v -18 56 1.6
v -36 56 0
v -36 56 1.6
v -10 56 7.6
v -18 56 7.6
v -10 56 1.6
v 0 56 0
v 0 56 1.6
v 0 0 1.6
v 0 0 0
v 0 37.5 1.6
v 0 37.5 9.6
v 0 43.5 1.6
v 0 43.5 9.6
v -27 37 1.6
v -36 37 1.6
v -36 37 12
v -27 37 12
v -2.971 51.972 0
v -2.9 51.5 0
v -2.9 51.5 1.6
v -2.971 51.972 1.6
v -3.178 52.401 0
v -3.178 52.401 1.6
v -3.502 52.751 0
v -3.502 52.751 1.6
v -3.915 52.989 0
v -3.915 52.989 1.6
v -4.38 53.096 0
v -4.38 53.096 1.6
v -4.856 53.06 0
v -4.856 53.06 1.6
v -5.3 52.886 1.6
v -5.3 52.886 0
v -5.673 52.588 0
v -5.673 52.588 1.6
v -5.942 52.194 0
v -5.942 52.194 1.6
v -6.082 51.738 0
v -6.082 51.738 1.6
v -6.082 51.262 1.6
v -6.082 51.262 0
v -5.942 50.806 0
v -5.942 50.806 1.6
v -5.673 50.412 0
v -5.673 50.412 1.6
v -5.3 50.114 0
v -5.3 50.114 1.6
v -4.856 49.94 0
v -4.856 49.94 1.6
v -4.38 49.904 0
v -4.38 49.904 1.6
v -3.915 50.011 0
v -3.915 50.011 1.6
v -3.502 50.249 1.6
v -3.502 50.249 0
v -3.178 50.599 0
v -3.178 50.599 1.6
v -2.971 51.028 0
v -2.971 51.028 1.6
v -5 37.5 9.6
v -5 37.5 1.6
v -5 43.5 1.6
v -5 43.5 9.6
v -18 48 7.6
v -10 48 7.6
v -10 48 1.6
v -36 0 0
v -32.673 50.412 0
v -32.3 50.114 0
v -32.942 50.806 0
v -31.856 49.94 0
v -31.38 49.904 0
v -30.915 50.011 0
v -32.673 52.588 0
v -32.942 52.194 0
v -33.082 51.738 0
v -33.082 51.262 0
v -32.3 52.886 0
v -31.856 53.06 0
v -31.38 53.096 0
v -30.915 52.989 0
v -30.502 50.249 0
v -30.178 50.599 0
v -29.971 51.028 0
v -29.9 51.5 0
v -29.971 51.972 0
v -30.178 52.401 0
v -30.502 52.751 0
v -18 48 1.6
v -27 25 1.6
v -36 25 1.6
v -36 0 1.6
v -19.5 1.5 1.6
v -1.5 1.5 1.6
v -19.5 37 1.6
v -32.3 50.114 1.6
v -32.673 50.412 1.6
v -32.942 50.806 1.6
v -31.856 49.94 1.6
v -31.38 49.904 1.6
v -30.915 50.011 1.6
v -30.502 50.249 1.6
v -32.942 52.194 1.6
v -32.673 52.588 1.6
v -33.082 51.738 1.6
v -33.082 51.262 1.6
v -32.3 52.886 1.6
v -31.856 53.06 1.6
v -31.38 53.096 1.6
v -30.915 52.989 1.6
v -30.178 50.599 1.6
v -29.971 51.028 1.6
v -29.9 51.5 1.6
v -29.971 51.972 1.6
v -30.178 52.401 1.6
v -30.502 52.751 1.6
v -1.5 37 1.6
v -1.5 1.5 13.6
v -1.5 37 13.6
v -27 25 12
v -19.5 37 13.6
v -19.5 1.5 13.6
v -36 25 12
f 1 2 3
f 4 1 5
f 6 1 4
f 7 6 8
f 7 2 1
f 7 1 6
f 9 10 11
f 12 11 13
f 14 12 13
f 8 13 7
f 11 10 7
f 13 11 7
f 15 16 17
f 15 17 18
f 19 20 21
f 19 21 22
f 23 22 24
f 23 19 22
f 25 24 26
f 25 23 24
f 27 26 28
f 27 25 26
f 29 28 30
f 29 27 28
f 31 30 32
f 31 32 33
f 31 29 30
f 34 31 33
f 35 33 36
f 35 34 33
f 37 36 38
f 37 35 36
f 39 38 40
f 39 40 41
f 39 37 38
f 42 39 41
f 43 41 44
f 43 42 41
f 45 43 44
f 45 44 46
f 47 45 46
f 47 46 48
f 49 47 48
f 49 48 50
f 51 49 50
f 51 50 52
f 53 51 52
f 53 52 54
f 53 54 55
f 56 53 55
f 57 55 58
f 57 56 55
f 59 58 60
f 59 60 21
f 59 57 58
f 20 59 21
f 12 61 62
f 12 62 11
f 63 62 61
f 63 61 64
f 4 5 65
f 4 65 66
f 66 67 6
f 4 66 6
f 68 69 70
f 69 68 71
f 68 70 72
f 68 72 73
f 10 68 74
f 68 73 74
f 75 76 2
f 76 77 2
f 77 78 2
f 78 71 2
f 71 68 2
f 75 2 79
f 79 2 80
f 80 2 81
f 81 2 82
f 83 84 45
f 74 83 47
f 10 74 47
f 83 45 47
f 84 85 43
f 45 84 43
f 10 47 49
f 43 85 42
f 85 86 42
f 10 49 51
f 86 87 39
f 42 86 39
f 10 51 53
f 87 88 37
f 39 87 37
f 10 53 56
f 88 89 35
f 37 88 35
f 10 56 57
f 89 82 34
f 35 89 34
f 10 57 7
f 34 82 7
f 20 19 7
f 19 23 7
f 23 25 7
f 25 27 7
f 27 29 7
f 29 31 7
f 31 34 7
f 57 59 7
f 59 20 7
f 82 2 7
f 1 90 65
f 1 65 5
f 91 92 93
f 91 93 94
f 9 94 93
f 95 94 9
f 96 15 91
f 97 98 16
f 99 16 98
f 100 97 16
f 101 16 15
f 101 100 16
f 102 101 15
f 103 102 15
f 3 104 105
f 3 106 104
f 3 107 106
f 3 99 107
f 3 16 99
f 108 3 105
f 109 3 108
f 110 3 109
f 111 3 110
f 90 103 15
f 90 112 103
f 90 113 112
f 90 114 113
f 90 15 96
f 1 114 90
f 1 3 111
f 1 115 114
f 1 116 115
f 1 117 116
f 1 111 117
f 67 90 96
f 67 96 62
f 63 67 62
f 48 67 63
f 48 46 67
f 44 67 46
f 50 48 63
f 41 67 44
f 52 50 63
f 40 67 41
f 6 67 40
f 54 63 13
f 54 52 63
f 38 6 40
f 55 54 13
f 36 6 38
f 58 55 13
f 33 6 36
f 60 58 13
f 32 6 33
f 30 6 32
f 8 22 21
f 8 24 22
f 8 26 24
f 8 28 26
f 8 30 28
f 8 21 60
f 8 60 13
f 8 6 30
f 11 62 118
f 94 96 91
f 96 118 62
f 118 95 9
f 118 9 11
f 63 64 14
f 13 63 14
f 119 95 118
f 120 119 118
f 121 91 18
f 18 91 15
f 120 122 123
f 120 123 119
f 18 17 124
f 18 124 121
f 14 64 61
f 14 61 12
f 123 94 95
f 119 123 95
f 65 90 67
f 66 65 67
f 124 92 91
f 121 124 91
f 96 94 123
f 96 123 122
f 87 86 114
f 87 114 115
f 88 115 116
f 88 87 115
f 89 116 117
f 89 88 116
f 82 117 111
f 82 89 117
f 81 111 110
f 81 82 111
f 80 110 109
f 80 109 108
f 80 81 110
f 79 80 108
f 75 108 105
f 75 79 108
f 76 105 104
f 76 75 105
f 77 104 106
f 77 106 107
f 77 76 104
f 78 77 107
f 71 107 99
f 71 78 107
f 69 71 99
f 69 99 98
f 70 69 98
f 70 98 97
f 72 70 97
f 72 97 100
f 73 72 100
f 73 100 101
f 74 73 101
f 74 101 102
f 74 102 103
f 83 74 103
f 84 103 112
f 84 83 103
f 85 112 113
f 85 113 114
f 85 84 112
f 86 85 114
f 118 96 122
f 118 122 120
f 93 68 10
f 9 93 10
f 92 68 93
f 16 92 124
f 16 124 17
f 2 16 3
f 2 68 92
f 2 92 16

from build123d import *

# Parameters (mm, degrees)
ESQUISSE1_W          = 36
ESQUISSE1_H          = 56
ESQUISSE1_R          = 1.6
BOARD_DEPTH          = 1.6
ESQUISSE2_W          = 8
ESQUISSE2_H          = 8
RS232_DEPTH          = 6
ESQUISSE3_W          = 5
ESQUISSE3_H          = 6
LIMIT_SWITCH_DEPTH   = 8
ESQUISSE4_W          = 18
ESQUISSE4_H          = 35.5
TEENSY_4_0_DEPTH     = 12
ESQUISSE5_W          = 9
ESQUISSE5_H          = 12
F_5V_REGULATOR_DEPTH = 10.4


with BuildPart() as part:
    # Esquisse1 → Board (new body)
    with BuildSketch(Plane.XY):
        with Locations((-18, 28)):
            Rectangle(ESQUISSE1_W, ESQUISSE1_H)
        with Locations((-31.5, 51.5)):
            Circle(ESQUISSE1_R, mode=Mode.SUBTRACT)
        with Locations((-4.5, 51.5)):
            Circle(ESQUISSE1_R, mode=Mode.SUBTRACT)
    extrude(amount=BOARD_DEPTH)

    # Esquisse2 → RS232 (add)
    with BuildSketch(Plane.XY.offset(1.6)):
        with Locations((-14, 52)):
            Rectangle(ESQUISSE2_W, ESQUISSE2_H)
    extrude(amount=RS232_DEPTH)

    # Esquisse3 → Limit switch (add)
    with BuildSketch(Plane.XY.offset(1.6)):
        with Locations((-2.5, 40.5)):
            Rectangle(ESQUISSE3_W, ESQUISSE3_H)
    extrude(amount=LIMIT_SWITCH_DEPTH)

    # Esquisse4 → Teensy 4.0 (add)
    with BuildSketch(Plane.XY.offset(1.6)):
        with Locations((-10.5, 19.25)):
            Rectangle(ESQUISSE4_W, ESQUISSE4_H)
    extrude(amount=TEENSY_4_0_DEPTH)

    # Esquisse5 → 5v regulator (add)
    with BuildSketch(Plane.XY.offset(1.6)):
        with Locations((-31.5, 31)):
            Rectangle(ESQUISSE5_W, ESQUISSE5_H)
    extrude(amount=F_5V_REGULATOR_DEPTH)


solid = part.part
